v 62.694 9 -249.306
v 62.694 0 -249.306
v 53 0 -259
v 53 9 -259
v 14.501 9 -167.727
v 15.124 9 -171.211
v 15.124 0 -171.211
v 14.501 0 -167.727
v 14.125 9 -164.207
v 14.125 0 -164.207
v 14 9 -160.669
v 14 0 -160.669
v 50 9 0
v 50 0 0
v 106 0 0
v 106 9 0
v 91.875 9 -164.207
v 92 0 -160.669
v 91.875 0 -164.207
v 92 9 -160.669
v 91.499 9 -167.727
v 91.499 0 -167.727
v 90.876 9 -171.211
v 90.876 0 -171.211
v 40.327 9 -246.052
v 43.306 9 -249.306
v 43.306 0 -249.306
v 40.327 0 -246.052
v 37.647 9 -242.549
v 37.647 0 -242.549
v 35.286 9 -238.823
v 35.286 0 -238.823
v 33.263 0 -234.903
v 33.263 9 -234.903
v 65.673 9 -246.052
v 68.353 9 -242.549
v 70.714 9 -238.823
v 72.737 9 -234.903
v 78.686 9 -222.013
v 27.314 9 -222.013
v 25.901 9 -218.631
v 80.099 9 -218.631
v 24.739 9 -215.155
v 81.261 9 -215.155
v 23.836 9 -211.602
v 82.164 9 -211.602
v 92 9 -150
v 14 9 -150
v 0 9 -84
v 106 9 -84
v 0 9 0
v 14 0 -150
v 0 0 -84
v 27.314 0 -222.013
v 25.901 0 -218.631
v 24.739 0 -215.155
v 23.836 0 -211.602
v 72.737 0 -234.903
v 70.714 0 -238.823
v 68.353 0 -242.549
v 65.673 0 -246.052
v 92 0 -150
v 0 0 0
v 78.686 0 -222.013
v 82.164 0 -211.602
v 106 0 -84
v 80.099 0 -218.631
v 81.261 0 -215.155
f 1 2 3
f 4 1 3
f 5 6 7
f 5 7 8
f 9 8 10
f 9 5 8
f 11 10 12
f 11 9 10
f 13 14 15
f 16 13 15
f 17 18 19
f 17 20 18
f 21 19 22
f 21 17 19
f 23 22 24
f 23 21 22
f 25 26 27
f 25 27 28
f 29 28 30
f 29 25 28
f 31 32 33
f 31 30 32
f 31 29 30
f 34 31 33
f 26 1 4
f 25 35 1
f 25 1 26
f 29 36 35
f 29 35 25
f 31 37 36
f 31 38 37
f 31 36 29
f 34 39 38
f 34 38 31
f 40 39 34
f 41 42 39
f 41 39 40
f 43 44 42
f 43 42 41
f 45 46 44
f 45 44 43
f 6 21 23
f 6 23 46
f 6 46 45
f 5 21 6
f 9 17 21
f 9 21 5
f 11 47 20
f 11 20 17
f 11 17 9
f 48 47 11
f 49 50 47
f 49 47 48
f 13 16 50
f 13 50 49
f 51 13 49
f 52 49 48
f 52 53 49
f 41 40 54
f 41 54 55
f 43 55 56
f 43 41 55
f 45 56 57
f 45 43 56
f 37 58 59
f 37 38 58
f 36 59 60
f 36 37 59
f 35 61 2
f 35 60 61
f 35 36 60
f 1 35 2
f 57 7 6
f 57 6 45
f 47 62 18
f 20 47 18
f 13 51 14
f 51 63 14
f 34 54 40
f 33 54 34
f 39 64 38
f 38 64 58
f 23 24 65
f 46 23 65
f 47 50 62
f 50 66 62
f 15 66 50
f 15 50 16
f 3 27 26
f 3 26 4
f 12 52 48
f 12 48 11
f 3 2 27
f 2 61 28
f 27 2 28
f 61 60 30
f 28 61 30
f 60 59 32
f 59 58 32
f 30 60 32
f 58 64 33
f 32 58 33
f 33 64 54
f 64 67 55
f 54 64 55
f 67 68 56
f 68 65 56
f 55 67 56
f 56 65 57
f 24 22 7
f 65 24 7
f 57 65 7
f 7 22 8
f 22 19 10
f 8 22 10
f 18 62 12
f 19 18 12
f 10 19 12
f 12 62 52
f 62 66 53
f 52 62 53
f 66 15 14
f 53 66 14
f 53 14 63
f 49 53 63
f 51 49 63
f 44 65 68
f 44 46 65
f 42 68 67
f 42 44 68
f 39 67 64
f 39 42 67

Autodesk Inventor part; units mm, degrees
ref_plane "YZ Plane" through (0, 0, 0) normal (1, 0, 0) x (0, 1, 0)
ref_plane "XZ Plane" through (0, 0, 0) normal (0, 1, 0) x (-1, 0, 0)
ref_plane "XY Plane" through (0, 0, 0) normal (0, 0, 1) x (1, 0, 0)
sketch "Boceto1" plane through (0, 0, 0) normal (0, 1, 0) x (-1, 0, 0)
  line L0 (0, 0) -> (-50, 0)
  line L1 (0, -84) -> (0, 0)
  line L2 (0, -84) -> (-14, -150)
  line L3 (-14, -150) -> (-14, -166)
  line L4 (-14, -166) -> (-25, -217)
  line L5 (-25, -217) -> (-37, -243)
  line L6 (-37, -243) -> (-53, -259)
  line L7 (-106, -84) -> (-106, 0)
  line L8 (-106, -84) -> (-92, -150)
  line L9 (-92, -150) -> (-92, -166)
  line L10 (-92, -166) -> (-81, -217)
  line L11 (-81, -217) -> (-69, -243)
  line L12 (-69, -243) -> (-53, -259)
  line L13 (0, 0) -> (-106, 0)
extrude "Extrusión1" add sketch "Boceto1" along normal blind 9
fillet "Empalme1" radius 50 1 edges at (92, 4.5, -166)
fillet "Empalme2" radius 50 1 edges at (14, 4.5, -166)
fillet "Empalme3" radius 50 4 edges at (25, 4.5, -217) (81, 4.5, -217) (69, 4.5, -243) (37, 4.5, -243)
equation "\"Radio_pliegue\" = Grosor"
equation "\"Anchura_desahogo_plegado\" = Grosor"
equation "\"Profundidad_desahogo_plegado\" = 0.5 * Grosor"
equation "\"Tamaño_destalonado\" = 4 * Grosor"
equation "\"Remanente_mínimo\" = 2 * Grosor"
equation "\"Radiodetransición\" = Radio_pliegue"
equation "\"Tamaño_de_radio_de_Jacobi\" = Radio_pliegue"
equation "\"TamañoSeparación\" = Grosor"
equation "\"Grosor\" = 0.5"
properties part number "chasis"
